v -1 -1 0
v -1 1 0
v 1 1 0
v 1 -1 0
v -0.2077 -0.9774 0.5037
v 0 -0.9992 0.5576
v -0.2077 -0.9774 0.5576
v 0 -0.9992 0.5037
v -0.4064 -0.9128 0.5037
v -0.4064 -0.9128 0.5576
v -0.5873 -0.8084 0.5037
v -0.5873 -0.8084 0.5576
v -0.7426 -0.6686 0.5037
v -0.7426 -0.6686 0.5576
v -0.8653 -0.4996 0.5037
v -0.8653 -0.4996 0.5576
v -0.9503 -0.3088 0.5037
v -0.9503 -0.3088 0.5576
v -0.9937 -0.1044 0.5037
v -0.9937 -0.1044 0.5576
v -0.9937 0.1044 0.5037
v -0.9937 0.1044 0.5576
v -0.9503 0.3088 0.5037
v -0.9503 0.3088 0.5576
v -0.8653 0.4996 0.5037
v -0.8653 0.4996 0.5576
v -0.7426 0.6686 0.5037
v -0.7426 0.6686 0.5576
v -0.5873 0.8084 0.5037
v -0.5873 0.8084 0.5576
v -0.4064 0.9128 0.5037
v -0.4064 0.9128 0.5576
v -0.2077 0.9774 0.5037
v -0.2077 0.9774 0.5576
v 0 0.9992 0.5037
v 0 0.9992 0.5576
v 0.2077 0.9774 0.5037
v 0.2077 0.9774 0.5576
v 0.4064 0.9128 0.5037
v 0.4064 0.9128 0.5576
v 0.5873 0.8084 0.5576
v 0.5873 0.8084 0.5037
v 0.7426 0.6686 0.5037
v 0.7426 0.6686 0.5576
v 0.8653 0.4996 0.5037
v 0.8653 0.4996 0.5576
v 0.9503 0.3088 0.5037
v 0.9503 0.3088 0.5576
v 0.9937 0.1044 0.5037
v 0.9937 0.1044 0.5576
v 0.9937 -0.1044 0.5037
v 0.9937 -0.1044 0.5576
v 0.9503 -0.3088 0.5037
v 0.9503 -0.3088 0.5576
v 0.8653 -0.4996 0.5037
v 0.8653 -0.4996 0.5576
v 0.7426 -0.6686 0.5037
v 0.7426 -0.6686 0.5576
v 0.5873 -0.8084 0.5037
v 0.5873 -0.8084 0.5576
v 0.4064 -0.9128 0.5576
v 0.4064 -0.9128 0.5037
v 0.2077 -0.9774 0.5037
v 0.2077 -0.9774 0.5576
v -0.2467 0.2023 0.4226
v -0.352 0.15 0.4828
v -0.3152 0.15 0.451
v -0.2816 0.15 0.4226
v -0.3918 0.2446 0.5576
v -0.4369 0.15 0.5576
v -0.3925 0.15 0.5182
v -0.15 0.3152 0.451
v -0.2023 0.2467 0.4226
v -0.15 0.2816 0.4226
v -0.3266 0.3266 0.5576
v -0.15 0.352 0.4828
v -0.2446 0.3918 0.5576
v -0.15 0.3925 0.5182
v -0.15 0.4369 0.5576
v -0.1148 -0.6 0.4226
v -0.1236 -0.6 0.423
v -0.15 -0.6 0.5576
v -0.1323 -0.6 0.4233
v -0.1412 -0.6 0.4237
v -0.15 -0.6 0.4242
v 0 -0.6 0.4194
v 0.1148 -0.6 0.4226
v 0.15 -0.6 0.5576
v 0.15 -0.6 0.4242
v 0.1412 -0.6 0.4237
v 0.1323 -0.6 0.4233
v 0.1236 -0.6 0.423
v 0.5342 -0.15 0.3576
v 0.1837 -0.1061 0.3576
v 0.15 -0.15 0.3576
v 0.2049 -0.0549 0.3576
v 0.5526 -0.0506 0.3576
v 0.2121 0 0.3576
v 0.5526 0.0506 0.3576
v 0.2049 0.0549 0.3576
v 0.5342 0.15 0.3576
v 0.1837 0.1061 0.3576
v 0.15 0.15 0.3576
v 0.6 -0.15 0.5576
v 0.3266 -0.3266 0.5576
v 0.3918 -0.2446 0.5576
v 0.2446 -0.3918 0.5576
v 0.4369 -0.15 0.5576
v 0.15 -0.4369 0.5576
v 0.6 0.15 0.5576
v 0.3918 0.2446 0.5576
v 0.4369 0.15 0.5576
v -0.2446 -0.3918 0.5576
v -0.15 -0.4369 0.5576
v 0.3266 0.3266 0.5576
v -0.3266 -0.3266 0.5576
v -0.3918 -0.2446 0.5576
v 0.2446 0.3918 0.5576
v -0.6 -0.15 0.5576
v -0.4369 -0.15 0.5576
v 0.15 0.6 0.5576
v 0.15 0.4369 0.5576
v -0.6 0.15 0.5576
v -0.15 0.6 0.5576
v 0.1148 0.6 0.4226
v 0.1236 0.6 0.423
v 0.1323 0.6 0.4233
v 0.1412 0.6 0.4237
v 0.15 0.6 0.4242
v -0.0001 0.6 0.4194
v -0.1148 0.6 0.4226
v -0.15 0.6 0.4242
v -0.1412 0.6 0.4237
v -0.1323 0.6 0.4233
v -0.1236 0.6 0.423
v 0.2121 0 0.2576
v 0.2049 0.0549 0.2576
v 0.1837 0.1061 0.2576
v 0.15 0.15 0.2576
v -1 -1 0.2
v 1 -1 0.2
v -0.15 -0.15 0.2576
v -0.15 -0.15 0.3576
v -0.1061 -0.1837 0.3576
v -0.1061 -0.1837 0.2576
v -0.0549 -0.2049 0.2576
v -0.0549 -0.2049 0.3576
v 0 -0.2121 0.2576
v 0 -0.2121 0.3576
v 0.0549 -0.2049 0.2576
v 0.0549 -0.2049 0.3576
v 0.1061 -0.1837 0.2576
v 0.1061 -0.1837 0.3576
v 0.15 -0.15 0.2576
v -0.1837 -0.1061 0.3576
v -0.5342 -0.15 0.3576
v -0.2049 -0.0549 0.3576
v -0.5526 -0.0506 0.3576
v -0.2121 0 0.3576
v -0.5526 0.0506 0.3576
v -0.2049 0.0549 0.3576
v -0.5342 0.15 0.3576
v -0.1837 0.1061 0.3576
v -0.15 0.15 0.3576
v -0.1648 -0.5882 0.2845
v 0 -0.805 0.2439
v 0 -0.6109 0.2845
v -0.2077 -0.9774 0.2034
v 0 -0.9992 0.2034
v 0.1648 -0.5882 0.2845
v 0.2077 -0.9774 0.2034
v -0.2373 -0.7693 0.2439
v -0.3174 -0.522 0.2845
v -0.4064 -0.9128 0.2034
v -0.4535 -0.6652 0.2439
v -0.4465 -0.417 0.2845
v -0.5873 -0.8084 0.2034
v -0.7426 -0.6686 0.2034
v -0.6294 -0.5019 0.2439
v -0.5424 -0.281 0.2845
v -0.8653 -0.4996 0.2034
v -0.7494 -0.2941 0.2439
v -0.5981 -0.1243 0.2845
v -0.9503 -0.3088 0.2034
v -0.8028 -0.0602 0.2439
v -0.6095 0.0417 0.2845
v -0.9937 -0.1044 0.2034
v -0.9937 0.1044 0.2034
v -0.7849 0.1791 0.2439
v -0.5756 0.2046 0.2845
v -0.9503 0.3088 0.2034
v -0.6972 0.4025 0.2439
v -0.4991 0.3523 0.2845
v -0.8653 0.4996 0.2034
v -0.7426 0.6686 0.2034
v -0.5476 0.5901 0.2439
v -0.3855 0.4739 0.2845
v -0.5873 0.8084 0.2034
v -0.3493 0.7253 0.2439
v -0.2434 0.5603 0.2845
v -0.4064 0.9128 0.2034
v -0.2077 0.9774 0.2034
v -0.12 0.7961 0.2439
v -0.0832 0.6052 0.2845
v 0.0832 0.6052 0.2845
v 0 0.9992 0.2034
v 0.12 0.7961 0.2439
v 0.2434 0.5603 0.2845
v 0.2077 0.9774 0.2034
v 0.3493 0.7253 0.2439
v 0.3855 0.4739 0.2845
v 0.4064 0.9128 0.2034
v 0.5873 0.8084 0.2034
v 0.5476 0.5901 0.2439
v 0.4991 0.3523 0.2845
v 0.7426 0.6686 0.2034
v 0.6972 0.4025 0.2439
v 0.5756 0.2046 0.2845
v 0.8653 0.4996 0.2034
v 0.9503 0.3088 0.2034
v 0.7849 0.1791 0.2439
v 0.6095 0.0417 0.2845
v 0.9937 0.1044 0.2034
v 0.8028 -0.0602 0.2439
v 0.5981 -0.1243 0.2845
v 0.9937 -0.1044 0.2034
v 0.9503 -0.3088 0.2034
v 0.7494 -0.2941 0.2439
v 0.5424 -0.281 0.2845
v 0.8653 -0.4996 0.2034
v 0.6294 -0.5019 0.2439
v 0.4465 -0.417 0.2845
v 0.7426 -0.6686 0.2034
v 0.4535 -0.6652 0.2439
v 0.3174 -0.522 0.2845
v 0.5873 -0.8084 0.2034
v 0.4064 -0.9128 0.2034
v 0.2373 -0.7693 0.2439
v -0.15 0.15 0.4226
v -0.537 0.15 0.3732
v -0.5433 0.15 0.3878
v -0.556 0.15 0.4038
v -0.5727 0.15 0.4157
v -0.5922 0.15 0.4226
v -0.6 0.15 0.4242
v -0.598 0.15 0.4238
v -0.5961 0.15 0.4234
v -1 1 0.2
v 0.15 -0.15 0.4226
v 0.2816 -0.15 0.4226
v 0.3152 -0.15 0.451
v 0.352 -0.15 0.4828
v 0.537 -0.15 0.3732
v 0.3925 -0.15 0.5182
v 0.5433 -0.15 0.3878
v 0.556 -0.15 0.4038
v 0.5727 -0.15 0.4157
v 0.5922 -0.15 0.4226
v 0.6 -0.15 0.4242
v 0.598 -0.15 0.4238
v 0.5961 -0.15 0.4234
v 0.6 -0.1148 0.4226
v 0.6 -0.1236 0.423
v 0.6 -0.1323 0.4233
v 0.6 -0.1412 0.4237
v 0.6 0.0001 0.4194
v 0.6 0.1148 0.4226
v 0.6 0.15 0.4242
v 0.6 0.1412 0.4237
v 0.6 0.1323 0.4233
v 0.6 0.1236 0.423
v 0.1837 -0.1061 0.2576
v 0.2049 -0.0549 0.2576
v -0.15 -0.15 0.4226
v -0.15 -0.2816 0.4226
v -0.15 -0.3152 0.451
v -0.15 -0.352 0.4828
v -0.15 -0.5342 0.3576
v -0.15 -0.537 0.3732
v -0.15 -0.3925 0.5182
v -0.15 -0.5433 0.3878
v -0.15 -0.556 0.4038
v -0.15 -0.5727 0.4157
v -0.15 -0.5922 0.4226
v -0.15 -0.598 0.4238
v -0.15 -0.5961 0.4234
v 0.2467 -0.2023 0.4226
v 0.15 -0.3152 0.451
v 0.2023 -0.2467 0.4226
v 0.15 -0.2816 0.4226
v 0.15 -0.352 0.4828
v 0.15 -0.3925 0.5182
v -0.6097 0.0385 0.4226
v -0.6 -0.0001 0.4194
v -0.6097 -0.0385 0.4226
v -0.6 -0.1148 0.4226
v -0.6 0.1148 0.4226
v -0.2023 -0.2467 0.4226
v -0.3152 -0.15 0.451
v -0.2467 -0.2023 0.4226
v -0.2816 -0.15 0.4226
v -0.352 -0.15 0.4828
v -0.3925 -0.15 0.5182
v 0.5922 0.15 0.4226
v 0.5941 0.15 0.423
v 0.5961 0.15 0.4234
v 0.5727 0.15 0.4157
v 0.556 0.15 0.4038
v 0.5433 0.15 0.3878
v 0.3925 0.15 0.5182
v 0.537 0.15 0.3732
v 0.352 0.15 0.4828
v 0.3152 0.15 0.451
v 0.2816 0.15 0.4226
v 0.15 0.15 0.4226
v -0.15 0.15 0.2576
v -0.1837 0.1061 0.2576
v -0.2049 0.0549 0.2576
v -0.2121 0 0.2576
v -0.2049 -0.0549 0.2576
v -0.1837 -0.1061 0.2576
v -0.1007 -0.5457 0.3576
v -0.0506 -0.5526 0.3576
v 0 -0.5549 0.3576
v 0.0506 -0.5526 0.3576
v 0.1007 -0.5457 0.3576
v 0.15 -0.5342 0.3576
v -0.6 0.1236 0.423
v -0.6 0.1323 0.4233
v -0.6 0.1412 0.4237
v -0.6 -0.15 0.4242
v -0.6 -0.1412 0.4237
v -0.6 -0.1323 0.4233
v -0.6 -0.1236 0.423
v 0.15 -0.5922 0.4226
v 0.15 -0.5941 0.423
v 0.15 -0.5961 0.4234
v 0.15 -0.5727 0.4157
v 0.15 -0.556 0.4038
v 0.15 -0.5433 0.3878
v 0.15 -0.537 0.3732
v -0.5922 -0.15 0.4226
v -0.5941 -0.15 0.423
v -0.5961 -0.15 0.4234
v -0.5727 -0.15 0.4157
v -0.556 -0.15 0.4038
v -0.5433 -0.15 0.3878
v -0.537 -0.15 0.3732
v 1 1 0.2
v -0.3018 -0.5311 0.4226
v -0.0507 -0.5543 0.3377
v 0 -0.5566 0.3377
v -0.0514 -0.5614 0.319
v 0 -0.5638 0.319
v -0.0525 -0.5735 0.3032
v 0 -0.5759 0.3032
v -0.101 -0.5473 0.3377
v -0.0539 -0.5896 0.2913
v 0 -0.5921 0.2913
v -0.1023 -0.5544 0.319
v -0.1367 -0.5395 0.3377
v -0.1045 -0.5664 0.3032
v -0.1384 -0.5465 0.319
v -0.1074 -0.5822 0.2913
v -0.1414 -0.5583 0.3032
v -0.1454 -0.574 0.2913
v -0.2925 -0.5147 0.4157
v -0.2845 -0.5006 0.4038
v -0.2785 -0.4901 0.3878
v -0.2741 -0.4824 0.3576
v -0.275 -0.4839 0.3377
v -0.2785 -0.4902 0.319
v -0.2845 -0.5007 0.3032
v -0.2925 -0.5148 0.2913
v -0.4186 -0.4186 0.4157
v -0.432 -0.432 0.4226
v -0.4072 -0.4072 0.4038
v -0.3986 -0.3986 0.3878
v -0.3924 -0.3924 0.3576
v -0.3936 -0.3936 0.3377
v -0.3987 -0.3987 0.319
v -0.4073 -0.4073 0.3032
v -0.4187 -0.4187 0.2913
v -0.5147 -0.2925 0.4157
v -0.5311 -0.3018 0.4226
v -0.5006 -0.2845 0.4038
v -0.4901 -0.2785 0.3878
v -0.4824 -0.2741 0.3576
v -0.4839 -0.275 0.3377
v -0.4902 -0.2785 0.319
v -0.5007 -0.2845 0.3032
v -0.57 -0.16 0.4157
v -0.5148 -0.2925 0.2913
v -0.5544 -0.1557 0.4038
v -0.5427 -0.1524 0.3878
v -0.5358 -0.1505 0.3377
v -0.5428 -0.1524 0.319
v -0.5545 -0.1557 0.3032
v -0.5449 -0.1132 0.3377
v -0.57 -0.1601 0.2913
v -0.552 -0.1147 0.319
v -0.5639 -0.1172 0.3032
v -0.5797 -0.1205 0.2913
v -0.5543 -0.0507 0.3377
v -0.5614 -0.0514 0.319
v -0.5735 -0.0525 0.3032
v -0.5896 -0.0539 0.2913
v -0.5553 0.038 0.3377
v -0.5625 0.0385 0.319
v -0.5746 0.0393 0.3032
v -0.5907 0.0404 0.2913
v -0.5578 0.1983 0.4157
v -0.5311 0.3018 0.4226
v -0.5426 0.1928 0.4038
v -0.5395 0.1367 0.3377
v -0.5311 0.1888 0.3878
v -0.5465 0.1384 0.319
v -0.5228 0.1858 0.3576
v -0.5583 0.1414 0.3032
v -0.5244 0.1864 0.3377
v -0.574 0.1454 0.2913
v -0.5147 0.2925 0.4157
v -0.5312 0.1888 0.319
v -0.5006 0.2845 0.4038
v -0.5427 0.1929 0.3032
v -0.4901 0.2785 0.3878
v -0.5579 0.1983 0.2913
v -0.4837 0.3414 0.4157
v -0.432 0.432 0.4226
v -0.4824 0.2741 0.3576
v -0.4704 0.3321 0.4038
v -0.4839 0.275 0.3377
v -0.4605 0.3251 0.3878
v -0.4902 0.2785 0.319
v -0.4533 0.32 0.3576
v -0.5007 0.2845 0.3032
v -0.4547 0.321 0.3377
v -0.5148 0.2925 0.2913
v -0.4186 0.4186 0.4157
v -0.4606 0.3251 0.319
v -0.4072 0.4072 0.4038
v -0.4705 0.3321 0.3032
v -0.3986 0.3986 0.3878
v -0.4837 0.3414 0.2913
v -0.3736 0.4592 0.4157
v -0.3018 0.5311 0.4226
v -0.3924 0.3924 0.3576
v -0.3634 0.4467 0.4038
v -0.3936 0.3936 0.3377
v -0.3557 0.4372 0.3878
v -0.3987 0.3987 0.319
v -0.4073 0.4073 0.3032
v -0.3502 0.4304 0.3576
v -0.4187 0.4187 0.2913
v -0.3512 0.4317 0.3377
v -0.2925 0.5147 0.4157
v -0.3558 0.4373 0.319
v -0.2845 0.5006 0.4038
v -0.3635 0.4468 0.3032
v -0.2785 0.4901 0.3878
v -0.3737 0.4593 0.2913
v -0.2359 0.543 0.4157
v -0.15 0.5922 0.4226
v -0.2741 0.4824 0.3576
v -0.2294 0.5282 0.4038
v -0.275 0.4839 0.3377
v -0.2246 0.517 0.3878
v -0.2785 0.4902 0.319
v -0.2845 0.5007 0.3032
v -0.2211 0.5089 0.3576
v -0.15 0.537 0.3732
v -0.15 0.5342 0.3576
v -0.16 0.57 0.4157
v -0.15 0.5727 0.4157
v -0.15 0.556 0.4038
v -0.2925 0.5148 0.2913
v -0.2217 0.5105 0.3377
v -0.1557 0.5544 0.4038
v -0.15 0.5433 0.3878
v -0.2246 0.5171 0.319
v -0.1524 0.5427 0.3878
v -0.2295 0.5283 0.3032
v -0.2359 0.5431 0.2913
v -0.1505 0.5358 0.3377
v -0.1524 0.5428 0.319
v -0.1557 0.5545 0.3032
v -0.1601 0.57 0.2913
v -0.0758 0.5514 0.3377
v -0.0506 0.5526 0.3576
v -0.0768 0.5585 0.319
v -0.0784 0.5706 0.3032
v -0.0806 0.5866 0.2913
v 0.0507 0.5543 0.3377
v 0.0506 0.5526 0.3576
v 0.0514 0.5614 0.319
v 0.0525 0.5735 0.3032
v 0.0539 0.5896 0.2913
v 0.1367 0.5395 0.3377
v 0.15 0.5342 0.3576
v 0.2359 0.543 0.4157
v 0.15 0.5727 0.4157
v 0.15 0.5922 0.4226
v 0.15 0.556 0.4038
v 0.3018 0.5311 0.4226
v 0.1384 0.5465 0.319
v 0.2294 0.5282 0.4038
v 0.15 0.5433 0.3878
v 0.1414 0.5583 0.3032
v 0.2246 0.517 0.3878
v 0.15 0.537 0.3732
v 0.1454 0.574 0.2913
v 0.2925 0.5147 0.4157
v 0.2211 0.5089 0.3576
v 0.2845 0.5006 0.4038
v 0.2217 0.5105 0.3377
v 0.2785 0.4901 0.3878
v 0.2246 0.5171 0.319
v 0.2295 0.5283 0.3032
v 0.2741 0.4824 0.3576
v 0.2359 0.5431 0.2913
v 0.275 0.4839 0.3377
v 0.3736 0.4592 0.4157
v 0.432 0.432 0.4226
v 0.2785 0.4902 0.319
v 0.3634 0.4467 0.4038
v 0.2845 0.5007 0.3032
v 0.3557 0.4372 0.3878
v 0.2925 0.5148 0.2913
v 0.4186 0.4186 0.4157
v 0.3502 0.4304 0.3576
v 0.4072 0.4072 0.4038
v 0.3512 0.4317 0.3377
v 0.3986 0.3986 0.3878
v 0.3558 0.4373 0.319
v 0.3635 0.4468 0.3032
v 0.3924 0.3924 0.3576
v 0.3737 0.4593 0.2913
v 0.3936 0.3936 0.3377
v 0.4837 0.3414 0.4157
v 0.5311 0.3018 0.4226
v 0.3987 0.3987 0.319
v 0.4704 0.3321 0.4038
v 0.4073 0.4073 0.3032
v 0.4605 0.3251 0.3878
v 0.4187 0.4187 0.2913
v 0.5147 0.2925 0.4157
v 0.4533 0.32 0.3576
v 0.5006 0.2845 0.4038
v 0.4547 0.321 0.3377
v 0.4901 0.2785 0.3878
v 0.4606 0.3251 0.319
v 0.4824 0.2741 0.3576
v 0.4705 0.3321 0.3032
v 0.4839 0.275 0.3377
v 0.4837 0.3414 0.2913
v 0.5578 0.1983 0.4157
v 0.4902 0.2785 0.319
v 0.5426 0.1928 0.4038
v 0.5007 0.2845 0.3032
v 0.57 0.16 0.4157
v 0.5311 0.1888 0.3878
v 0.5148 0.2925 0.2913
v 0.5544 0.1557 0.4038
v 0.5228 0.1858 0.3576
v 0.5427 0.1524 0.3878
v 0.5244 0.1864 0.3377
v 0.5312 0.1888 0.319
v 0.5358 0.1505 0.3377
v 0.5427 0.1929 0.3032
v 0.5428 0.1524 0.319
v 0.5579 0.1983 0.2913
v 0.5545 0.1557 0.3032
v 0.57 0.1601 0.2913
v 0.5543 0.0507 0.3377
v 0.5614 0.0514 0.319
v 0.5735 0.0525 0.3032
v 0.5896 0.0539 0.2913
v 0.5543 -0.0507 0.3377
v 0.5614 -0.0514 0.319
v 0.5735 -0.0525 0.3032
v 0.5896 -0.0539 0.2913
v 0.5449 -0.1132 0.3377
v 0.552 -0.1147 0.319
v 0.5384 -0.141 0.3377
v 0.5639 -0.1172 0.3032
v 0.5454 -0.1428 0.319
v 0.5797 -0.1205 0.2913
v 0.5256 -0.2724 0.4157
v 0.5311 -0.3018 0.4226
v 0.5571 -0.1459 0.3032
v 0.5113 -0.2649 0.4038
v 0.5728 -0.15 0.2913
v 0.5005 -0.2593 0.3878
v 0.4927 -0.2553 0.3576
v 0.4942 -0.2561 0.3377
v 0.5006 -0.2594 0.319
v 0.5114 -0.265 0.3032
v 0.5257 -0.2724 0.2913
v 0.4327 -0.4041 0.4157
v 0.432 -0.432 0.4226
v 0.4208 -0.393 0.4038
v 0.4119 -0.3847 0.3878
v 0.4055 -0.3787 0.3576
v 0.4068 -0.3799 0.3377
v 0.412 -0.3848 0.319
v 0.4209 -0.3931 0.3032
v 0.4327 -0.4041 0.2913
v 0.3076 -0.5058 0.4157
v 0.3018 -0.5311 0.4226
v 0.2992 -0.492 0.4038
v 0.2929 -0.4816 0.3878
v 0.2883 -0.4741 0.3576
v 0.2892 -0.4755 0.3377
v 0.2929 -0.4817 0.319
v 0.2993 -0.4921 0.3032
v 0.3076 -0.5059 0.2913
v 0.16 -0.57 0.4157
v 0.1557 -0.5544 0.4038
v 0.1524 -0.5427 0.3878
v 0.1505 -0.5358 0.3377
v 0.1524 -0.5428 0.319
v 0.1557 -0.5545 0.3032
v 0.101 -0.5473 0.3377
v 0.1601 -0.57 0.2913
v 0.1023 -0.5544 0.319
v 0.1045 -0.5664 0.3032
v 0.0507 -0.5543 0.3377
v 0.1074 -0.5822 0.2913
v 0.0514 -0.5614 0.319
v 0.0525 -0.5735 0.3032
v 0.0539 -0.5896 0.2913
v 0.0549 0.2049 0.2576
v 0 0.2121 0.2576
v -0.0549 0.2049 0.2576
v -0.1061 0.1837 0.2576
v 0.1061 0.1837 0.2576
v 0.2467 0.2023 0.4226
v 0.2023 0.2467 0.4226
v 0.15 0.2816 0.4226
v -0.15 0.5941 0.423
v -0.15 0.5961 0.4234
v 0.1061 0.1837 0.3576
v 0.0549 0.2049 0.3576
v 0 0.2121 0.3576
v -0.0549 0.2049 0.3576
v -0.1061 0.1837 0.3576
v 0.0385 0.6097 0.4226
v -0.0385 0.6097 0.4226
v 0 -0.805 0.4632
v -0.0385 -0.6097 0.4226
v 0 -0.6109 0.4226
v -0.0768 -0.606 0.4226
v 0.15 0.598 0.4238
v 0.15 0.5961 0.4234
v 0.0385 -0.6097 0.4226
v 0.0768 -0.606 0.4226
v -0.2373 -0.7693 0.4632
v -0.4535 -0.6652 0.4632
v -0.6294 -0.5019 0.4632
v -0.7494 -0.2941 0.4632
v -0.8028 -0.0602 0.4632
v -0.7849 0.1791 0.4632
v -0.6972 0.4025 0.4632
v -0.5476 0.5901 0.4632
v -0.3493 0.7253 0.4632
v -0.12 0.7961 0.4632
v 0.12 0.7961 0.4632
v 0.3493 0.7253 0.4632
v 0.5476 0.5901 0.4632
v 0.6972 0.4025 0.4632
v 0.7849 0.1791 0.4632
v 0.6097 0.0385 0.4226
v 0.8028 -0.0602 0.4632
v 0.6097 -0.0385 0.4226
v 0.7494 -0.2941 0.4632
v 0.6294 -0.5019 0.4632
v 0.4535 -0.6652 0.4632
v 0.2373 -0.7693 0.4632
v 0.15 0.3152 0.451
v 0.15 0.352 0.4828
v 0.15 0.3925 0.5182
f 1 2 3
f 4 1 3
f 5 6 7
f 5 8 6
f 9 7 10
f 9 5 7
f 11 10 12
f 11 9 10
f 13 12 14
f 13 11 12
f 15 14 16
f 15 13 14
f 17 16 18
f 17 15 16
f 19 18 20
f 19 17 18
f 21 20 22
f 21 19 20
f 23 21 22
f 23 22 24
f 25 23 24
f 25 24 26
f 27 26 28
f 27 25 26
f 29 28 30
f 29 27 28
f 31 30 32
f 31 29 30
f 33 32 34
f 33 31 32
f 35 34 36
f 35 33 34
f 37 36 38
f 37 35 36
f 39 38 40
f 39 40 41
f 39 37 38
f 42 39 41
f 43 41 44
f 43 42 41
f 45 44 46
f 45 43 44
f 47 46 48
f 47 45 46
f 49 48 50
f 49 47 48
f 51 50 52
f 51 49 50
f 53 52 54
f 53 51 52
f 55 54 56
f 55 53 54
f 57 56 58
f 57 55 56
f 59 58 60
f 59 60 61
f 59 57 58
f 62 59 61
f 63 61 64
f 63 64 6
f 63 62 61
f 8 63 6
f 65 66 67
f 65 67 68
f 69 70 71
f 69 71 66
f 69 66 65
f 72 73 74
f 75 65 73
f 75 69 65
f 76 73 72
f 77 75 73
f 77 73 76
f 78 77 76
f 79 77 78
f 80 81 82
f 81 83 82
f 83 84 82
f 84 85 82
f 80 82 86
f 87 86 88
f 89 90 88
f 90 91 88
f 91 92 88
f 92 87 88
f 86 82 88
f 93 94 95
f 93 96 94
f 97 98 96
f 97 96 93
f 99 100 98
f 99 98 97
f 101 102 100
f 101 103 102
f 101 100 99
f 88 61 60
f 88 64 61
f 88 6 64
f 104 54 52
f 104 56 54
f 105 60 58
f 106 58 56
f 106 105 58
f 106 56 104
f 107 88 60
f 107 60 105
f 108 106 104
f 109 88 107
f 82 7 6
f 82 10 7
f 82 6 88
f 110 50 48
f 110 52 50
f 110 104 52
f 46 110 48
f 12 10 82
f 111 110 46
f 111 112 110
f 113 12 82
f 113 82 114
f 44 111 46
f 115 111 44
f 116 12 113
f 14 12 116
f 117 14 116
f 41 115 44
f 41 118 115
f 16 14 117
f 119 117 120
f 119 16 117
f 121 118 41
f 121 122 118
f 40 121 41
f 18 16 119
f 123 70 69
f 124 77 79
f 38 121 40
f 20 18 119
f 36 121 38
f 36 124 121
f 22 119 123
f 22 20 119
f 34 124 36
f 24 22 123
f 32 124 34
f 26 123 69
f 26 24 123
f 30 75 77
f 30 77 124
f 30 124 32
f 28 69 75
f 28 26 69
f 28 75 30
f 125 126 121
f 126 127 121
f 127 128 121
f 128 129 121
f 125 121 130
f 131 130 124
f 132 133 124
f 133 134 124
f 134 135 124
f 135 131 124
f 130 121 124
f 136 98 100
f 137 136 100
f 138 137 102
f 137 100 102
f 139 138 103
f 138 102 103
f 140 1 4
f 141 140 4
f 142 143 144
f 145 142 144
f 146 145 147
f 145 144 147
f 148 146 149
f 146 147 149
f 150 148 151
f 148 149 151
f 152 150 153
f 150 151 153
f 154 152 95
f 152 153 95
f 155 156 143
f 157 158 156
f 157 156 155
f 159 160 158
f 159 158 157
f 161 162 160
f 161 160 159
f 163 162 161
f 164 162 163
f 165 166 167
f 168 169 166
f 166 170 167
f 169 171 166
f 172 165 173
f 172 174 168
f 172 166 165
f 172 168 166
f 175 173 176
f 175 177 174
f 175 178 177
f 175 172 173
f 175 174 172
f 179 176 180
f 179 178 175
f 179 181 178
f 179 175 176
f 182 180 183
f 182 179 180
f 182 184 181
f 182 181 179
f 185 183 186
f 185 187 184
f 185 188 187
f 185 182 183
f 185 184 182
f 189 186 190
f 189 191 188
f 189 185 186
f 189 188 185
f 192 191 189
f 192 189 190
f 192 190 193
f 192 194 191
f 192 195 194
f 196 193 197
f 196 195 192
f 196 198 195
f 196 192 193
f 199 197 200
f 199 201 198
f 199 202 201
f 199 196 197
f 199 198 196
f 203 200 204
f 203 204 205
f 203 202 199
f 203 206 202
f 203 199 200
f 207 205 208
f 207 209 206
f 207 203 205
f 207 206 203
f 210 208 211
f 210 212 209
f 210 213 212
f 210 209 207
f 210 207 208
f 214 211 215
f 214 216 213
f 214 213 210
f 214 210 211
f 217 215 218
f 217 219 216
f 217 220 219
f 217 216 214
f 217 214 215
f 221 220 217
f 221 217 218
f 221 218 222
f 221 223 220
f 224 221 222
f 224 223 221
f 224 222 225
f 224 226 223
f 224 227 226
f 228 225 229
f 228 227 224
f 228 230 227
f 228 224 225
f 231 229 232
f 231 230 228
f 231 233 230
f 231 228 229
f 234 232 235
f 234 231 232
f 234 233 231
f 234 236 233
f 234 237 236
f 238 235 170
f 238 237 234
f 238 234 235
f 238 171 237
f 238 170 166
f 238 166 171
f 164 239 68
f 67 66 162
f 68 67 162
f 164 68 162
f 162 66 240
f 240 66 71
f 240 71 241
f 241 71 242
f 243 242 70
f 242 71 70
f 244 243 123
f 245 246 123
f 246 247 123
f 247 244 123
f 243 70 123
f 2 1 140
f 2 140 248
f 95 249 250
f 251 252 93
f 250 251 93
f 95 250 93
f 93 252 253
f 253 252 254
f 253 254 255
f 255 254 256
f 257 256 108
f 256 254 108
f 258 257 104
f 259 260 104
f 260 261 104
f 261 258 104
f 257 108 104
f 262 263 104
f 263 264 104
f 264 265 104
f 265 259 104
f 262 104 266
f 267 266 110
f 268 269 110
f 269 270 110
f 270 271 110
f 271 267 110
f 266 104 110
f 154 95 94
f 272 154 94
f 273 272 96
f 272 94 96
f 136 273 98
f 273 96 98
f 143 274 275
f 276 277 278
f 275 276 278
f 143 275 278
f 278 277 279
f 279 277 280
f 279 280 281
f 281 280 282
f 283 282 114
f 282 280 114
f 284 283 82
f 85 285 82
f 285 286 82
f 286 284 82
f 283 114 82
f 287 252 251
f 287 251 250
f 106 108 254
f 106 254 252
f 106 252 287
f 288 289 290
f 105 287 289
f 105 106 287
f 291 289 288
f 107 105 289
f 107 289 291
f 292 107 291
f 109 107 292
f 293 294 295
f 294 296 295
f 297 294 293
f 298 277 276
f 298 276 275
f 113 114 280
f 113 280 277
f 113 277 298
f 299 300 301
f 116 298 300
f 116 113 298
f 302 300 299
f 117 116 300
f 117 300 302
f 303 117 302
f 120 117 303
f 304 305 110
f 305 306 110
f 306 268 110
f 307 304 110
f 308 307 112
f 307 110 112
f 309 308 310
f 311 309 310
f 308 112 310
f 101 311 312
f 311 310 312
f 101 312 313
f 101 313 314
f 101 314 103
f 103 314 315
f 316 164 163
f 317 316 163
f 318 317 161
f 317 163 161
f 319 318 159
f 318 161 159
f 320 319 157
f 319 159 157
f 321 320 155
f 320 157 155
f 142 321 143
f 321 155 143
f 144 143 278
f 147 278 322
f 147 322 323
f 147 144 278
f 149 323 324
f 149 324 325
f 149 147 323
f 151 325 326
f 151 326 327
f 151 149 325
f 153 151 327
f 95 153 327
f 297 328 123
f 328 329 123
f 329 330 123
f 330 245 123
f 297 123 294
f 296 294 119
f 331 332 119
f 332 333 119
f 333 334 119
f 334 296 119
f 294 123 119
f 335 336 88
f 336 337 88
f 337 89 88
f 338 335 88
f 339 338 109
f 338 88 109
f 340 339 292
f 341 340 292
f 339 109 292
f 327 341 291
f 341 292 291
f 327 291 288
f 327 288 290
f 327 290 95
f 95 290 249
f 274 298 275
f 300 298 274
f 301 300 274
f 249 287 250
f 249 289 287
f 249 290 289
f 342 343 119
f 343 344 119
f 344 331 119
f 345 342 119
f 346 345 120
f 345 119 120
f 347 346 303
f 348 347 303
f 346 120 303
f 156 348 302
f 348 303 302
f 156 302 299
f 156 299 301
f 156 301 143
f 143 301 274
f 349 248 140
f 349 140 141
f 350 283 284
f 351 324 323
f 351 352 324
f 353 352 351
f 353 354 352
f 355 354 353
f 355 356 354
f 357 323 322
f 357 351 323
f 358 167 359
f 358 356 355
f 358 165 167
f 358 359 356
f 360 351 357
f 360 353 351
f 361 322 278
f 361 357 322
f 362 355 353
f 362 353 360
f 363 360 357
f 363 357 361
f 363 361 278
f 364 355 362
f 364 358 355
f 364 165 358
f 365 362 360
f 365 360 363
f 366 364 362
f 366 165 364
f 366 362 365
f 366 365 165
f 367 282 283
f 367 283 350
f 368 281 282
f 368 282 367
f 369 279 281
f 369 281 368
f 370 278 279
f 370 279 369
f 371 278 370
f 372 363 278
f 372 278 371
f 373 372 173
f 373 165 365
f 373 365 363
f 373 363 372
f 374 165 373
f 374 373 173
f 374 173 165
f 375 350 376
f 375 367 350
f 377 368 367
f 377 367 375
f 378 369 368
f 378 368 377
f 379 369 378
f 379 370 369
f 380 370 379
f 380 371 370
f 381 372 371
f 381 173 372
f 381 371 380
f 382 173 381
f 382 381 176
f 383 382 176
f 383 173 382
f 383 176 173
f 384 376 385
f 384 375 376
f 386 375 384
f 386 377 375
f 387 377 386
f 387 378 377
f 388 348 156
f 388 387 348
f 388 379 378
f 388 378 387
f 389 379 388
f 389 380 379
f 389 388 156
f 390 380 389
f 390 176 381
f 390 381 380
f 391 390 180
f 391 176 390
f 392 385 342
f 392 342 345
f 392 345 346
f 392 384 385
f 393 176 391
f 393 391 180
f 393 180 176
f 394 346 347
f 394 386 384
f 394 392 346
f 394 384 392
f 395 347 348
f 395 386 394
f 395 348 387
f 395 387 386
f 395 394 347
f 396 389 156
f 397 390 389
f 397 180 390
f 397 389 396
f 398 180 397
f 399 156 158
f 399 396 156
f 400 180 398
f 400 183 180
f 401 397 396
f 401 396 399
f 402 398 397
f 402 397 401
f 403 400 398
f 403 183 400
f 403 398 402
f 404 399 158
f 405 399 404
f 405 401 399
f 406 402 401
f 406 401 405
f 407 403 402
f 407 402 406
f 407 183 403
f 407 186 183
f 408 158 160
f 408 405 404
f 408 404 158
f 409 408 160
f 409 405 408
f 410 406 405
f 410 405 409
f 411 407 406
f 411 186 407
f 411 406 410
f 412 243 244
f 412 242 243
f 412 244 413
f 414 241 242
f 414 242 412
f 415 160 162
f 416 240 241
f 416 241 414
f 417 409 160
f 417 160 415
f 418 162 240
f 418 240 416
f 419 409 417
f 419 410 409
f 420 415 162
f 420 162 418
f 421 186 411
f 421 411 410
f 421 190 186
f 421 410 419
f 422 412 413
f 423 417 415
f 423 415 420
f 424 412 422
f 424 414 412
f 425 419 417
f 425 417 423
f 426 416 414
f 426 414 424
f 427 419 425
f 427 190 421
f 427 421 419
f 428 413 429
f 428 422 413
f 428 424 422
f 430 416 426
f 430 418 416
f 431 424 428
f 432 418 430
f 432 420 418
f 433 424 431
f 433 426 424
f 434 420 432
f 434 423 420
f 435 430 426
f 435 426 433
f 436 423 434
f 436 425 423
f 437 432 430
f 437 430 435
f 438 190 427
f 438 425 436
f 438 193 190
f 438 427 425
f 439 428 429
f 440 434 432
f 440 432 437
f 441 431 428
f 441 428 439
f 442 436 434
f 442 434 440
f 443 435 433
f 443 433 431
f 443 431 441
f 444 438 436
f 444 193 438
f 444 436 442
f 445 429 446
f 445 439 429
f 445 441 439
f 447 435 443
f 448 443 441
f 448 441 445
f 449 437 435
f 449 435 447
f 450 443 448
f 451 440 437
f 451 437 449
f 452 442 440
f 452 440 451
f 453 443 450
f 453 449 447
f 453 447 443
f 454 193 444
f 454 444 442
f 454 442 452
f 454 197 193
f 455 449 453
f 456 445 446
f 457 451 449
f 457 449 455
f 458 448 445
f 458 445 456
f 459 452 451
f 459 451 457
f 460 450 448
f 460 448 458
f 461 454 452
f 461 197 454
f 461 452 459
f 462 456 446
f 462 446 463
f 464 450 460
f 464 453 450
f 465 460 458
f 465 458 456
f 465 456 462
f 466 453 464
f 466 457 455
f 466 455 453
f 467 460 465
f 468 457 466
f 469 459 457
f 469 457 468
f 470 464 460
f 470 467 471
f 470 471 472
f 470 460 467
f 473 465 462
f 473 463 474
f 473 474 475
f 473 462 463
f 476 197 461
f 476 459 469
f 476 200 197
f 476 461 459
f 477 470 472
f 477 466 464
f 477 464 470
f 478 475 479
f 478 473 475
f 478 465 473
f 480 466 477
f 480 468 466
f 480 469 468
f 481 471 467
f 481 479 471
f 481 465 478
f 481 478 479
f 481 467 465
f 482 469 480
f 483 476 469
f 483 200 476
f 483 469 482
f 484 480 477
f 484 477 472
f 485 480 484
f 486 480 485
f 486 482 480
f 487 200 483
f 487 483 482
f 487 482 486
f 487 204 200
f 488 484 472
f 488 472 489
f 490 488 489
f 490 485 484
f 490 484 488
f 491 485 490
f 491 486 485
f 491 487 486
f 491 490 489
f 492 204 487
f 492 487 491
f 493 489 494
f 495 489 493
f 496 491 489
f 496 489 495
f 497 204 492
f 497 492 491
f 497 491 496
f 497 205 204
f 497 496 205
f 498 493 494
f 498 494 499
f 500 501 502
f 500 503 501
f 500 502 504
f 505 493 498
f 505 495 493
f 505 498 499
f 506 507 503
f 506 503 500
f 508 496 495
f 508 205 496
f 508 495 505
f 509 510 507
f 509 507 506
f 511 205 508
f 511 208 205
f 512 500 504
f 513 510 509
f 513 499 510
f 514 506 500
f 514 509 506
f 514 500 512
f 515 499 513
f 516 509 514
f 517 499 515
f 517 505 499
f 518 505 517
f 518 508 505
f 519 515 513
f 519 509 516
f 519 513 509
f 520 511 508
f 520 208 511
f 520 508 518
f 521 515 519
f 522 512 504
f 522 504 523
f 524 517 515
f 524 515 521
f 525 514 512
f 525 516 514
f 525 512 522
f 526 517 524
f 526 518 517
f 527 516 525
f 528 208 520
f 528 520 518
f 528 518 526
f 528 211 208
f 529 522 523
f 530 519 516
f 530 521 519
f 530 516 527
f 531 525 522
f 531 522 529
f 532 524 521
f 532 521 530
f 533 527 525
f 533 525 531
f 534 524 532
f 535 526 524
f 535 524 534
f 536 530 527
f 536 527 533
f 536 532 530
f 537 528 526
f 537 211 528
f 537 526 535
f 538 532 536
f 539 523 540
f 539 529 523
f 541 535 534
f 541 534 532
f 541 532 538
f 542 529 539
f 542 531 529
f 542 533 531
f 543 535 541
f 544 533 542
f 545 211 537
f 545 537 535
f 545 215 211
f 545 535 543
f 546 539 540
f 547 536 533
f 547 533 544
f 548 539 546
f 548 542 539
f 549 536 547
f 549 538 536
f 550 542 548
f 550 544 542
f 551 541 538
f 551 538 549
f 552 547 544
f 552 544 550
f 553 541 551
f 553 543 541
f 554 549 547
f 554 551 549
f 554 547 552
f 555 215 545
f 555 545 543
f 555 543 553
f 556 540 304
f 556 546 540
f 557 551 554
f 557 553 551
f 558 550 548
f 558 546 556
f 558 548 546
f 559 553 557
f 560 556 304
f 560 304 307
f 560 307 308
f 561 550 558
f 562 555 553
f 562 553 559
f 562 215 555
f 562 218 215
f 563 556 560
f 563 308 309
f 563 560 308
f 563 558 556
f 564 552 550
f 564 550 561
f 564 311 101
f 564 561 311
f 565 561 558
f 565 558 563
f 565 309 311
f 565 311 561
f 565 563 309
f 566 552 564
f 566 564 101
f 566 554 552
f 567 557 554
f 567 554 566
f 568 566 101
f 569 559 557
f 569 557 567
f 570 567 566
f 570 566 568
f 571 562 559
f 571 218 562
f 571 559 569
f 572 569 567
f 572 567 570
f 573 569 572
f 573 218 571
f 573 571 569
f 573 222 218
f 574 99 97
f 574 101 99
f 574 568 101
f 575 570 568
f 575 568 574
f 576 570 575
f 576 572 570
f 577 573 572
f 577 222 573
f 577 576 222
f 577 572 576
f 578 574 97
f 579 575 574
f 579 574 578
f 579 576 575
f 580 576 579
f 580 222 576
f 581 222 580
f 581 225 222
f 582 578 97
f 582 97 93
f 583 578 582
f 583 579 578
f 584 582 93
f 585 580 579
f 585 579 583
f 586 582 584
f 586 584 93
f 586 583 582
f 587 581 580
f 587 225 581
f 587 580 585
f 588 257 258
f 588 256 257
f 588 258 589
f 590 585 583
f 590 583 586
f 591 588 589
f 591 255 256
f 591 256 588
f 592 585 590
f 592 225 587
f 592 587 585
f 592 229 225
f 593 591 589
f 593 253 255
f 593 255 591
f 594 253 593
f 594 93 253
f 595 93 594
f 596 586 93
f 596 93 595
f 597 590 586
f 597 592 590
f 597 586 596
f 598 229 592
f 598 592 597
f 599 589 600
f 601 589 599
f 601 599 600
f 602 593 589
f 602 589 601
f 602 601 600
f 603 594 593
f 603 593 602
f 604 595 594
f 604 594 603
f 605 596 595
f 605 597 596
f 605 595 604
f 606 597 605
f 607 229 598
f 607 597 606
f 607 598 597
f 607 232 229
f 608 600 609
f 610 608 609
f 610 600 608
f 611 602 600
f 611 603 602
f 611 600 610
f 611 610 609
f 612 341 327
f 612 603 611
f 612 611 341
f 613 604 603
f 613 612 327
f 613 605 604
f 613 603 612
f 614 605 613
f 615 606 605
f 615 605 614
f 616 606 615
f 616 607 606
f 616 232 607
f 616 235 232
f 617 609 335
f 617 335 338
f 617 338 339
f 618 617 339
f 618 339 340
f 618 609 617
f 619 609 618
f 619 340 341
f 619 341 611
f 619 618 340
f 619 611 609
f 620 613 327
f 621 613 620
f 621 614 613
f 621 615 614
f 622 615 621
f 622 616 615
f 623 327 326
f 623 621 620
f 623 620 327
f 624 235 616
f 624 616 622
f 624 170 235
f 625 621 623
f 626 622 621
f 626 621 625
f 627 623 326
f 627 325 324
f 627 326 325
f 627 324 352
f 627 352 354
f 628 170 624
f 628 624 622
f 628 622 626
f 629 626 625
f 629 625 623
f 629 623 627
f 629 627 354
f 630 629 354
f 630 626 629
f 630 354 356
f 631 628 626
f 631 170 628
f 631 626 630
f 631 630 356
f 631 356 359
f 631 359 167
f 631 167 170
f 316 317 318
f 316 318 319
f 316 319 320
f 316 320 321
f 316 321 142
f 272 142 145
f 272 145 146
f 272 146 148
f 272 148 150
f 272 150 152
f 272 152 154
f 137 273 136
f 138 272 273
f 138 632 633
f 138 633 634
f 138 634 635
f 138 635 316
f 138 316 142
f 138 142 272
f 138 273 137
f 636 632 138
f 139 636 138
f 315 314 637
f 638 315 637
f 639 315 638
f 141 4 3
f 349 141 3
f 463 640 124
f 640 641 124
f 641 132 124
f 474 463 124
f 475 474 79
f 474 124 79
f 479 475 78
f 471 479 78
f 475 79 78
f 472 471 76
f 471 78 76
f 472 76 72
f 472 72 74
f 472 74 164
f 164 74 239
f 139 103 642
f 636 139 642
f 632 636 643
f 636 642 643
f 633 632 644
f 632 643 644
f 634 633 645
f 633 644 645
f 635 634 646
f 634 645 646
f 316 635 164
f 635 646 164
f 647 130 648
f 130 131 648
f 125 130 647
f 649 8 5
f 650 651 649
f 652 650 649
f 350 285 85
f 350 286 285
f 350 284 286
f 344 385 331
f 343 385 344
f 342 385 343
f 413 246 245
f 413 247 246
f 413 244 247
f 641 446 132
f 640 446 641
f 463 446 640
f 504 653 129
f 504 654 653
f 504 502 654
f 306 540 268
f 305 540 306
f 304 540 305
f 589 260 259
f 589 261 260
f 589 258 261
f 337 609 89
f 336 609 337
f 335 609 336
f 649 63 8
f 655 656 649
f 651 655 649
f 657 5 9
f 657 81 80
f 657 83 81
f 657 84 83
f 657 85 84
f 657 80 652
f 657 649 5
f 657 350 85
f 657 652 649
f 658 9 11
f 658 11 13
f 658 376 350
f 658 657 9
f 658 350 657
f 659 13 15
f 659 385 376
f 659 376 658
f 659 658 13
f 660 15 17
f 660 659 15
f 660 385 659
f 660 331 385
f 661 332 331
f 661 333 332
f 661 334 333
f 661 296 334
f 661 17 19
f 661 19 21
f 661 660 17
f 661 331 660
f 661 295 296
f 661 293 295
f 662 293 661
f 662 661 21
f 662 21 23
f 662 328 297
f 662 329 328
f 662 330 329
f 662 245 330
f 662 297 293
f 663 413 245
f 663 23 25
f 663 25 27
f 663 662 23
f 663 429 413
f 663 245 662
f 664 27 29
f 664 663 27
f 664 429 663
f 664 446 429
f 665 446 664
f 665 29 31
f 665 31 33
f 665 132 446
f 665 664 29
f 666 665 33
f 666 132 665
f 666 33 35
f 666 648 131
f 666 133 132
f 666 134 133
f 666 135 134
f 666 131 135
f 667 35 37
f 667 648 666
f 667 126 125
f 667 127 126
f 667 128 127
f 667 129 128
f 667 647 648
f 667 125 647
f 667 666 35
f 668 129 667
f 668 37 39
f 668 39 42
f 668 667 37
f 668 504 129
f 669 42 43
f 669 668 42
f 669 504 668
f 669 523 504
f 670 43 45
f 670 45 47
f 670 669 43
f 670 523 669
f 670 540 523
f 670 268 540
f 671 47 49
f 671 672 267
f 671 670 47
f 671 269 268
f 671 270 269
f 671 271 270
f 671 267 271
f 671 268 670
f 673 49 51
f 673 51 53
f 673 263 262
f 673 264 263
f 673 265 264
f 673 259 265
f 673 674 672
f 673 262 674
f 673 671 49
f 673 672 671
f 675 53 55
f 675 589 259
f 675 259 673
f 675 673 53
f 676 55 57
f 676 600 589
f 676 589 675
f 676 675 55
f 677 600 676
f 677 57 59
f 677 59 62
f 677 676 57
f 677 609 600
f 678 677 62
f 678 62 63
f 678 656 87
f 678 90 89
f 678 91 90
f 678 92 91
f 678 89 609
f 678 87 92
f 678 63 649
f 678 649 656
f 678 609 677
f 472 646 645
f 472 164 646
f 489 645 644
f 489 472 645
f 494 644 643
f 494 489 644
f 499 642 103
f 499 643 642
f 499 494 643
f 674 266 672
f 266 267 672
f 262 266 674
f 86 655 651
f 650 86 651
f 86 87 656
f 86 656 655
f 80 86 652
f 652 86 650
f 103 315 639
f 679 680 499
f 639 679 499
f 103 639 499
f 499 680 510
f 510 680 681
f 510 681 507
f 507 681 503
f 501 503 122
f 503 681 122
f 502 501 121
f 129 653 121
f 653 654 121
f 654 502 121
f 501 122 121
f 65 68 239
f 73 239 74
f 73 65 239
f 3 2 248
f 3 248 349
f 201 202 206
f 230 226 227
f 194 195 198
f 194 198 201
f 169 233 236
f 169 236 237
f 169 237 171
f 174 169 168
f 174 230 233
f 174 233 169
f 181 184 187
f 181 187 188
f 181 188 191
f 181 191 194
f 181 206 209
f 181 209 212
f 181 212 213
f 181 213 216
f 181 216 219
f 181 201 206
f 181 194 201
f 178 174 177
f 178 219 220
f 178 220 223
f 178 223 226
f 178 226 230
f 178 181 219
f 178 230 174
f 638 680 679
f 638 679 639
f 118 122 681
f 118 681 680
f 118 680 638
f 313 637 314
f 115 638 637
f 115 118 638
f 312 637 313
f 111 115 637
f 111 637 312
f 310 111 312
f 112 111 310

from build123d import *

# Parameters (mm, degrees)
F0_W     = 2
F0_H     = 2
F1_DEPTH = 0.2
F4_W     = 0.3
F4_H     = 0.3
F5_DEPTH = 0.2
F7_DEPTH = 0.1


with BuildPart() as f1:
    # F0 (on Top) → F1 (new body)
    with BuildSketch(Plane.XY):
        Rectangle(F0_W, F0_H)
    extrude(amount=F1_DEPTH)


with BuildPart() as f3:
    # F2 (on Right) → F3 (revolve)
    with BuildSketch(Plane.YZ):
        with BuildLine():
            Line((-0.6108845701, 0.2844980918), (-0.9992043488, 0.2033823257))
            Line((-0.9992043488, 0.2033823257), (0, 0.2033823257))
            Line((0, 0.2033823257), (0, 0.4225981247))
            Line((0, 0.4225981247), (-0.3190304269, 0.4225981247))
            Line((-0.3190304269, 0.4225981247), (-0.4619063984, 0.5576497642))
            Line((-0.4619063984, 0.5576497642), (-0.9992043488, 0.5576497642))
            Line((-0.9992043488, 0.5576497642), (-0.9992043488, 0.5037138908))
            Line((-0.9992043488, 0.5037138908), (-0.6108845701, 0.4225981247))
            ThreePointArc((-0.6108845701, 0.4225981247), (-0.5547679468, 0.3535481083), (-0.6108845701, 0.2844980918))
        make_face()
    revolve(axis=Axis((0, 0, 0.3129902252), (0, 0, -1)))

    # F4 (on face) → F5 (cut)
    with BuildSketch(Plane.XY.offset(0.5576497642)):
        with BuildLine():
            Line((0.15, -0.6), (0.15, -0.4368724309))
            ThreePointArc((0.15, -0.4368724309), (0, -0.4619063984), (-0.15, -0.4368724309))
            Line((-0.15, -0.4368724309), (-0.15, -0.6))
            Line((-0.15, -0.6), (0.15, -0.6))
        make_face()
        with BuildLine():
            Line((0.15, -0.4368724309), (0.15, -0.15))
            Line((0.15, -0.15), (-0.15, -0.15))
            Line((-0.15, -0.15), (-0.15, -0.4368724309))
            ThreePointArc((-0.15, -0.4368724309), (0, -0.4619063984), (0.15, -0.4368724309))
        make_face()
        Rectangle(F4_W, F4_H)
        with BuildLine():
            Line((-0.15, 0.15), (0.15, 0.15))
            Line((0.15, 0.15), (0.15, 0.4368724309))
            ThreePointArc((0.15, 0.4368724309), (0, 0.4619063984), (-0.15, 0.4368724309))
            Line((-0.15, 0.4368724309), (-0.15, 0.15))
        make_face()
        with BuildLine():
            ThreePointArc((-0.15, 0.4368724309), (0, 0.4619063984), (0.15, 0.4368724309))
            Line((0.15, 0.4368724309), (0.15, 0.6))
            Line((0.15, 0.6), (-0.15, 0.6))
            Line((-0.15, 0.6), (-0.15, 0.4368724309))
        make_face()
        with BuildLine():
            ThreePointArc((0.4619063984, 0), (0.4556049232, 0.0760373256), (0.4368724309, 0.15))
            Line((0.4368724309, 0.15), (0.15, 0.15))
            Line((0.15, 0.15), (0.15, -0.15))
            Line((0.15, -0.15), (0.4368724309, -0.15))
            ThreePointArc((0.4368724309, -0.15), (0.4556049232, -0.0760373256), (0.4619063984, 0))
        make_face()
        with BuildLine():
            Line((0.6, -0.15), (0.6, 0.15))
            Line((0.6, 0.15), (0.4368724309, 0.15))
            ThreePointArc((0.4368724309, 0.15), (0.4556049232, 0.0760373256), (0.4619063984, 0))
            ThreePointArc((0.4619063984, 0), (0.4556049232, -0.0760373256), (0.4368724309, -0.15))
            Line((0.4368724309, -0.15), (0.6, -0.15))
        make_face()
        with BuildLine():
            ThreePointArc((-0.4368724309, -0.15), (-0.4619063984, 0), (-0.4368724309, 0.15))
            Line((-0.4368724309, 0.15), (-0.6, 0.15))
            Line((-0.6, 0.15), (-0.6, -0.15))
            Line((-0.6, -0.15), (-0.4368724309, -0.15))
        make_face()
        with BuildLine():
            Line((-0.15, -0.15), (-0.15, 0.15))
            Line((-0.15, 0.15), (-0.4368724309, 0.15))
            ThreePointArc((-0.4368724309, 0.15), (-0.4619063984, 0), (-0.4368724309, -0.15))
            Line((-0.4368724309, -0.15), (-0.15, -0.15))
        make_face()
    extrude(amount=-F5_DEPTH, mode=Mode.SUBTRACT)

    # F6 (on face) → F7 (cut)
    with BuildSketch(Plane.XY.offset(0.3576497642)):
        with BuildLine():
            ThreePointArc((0.15, -0.15), (0.1959844447, -0.081179415), (0.2121320344, 0))
            ThreePointArc((0.2121320344, 0), (0.1959844447, 0.081179415), (0.15, 0.15))
            ThreePointArc((0.15, 0.15), (0, 0.2121320344), (-0.15, 0.15))
            ThreePointArc((-0.15, 0.15), (-0.2121320344, 0), (-0.15, -0.15))
            ThreePointArc((-0.15, -0.15), (0, -0.2121320344), (0.15, -0.15))
        make_face()
    extrude(amount=-F7_DEPTH, mode=Mode.SUBTRACT)


solid = Compound([f1.part, f3.part])
